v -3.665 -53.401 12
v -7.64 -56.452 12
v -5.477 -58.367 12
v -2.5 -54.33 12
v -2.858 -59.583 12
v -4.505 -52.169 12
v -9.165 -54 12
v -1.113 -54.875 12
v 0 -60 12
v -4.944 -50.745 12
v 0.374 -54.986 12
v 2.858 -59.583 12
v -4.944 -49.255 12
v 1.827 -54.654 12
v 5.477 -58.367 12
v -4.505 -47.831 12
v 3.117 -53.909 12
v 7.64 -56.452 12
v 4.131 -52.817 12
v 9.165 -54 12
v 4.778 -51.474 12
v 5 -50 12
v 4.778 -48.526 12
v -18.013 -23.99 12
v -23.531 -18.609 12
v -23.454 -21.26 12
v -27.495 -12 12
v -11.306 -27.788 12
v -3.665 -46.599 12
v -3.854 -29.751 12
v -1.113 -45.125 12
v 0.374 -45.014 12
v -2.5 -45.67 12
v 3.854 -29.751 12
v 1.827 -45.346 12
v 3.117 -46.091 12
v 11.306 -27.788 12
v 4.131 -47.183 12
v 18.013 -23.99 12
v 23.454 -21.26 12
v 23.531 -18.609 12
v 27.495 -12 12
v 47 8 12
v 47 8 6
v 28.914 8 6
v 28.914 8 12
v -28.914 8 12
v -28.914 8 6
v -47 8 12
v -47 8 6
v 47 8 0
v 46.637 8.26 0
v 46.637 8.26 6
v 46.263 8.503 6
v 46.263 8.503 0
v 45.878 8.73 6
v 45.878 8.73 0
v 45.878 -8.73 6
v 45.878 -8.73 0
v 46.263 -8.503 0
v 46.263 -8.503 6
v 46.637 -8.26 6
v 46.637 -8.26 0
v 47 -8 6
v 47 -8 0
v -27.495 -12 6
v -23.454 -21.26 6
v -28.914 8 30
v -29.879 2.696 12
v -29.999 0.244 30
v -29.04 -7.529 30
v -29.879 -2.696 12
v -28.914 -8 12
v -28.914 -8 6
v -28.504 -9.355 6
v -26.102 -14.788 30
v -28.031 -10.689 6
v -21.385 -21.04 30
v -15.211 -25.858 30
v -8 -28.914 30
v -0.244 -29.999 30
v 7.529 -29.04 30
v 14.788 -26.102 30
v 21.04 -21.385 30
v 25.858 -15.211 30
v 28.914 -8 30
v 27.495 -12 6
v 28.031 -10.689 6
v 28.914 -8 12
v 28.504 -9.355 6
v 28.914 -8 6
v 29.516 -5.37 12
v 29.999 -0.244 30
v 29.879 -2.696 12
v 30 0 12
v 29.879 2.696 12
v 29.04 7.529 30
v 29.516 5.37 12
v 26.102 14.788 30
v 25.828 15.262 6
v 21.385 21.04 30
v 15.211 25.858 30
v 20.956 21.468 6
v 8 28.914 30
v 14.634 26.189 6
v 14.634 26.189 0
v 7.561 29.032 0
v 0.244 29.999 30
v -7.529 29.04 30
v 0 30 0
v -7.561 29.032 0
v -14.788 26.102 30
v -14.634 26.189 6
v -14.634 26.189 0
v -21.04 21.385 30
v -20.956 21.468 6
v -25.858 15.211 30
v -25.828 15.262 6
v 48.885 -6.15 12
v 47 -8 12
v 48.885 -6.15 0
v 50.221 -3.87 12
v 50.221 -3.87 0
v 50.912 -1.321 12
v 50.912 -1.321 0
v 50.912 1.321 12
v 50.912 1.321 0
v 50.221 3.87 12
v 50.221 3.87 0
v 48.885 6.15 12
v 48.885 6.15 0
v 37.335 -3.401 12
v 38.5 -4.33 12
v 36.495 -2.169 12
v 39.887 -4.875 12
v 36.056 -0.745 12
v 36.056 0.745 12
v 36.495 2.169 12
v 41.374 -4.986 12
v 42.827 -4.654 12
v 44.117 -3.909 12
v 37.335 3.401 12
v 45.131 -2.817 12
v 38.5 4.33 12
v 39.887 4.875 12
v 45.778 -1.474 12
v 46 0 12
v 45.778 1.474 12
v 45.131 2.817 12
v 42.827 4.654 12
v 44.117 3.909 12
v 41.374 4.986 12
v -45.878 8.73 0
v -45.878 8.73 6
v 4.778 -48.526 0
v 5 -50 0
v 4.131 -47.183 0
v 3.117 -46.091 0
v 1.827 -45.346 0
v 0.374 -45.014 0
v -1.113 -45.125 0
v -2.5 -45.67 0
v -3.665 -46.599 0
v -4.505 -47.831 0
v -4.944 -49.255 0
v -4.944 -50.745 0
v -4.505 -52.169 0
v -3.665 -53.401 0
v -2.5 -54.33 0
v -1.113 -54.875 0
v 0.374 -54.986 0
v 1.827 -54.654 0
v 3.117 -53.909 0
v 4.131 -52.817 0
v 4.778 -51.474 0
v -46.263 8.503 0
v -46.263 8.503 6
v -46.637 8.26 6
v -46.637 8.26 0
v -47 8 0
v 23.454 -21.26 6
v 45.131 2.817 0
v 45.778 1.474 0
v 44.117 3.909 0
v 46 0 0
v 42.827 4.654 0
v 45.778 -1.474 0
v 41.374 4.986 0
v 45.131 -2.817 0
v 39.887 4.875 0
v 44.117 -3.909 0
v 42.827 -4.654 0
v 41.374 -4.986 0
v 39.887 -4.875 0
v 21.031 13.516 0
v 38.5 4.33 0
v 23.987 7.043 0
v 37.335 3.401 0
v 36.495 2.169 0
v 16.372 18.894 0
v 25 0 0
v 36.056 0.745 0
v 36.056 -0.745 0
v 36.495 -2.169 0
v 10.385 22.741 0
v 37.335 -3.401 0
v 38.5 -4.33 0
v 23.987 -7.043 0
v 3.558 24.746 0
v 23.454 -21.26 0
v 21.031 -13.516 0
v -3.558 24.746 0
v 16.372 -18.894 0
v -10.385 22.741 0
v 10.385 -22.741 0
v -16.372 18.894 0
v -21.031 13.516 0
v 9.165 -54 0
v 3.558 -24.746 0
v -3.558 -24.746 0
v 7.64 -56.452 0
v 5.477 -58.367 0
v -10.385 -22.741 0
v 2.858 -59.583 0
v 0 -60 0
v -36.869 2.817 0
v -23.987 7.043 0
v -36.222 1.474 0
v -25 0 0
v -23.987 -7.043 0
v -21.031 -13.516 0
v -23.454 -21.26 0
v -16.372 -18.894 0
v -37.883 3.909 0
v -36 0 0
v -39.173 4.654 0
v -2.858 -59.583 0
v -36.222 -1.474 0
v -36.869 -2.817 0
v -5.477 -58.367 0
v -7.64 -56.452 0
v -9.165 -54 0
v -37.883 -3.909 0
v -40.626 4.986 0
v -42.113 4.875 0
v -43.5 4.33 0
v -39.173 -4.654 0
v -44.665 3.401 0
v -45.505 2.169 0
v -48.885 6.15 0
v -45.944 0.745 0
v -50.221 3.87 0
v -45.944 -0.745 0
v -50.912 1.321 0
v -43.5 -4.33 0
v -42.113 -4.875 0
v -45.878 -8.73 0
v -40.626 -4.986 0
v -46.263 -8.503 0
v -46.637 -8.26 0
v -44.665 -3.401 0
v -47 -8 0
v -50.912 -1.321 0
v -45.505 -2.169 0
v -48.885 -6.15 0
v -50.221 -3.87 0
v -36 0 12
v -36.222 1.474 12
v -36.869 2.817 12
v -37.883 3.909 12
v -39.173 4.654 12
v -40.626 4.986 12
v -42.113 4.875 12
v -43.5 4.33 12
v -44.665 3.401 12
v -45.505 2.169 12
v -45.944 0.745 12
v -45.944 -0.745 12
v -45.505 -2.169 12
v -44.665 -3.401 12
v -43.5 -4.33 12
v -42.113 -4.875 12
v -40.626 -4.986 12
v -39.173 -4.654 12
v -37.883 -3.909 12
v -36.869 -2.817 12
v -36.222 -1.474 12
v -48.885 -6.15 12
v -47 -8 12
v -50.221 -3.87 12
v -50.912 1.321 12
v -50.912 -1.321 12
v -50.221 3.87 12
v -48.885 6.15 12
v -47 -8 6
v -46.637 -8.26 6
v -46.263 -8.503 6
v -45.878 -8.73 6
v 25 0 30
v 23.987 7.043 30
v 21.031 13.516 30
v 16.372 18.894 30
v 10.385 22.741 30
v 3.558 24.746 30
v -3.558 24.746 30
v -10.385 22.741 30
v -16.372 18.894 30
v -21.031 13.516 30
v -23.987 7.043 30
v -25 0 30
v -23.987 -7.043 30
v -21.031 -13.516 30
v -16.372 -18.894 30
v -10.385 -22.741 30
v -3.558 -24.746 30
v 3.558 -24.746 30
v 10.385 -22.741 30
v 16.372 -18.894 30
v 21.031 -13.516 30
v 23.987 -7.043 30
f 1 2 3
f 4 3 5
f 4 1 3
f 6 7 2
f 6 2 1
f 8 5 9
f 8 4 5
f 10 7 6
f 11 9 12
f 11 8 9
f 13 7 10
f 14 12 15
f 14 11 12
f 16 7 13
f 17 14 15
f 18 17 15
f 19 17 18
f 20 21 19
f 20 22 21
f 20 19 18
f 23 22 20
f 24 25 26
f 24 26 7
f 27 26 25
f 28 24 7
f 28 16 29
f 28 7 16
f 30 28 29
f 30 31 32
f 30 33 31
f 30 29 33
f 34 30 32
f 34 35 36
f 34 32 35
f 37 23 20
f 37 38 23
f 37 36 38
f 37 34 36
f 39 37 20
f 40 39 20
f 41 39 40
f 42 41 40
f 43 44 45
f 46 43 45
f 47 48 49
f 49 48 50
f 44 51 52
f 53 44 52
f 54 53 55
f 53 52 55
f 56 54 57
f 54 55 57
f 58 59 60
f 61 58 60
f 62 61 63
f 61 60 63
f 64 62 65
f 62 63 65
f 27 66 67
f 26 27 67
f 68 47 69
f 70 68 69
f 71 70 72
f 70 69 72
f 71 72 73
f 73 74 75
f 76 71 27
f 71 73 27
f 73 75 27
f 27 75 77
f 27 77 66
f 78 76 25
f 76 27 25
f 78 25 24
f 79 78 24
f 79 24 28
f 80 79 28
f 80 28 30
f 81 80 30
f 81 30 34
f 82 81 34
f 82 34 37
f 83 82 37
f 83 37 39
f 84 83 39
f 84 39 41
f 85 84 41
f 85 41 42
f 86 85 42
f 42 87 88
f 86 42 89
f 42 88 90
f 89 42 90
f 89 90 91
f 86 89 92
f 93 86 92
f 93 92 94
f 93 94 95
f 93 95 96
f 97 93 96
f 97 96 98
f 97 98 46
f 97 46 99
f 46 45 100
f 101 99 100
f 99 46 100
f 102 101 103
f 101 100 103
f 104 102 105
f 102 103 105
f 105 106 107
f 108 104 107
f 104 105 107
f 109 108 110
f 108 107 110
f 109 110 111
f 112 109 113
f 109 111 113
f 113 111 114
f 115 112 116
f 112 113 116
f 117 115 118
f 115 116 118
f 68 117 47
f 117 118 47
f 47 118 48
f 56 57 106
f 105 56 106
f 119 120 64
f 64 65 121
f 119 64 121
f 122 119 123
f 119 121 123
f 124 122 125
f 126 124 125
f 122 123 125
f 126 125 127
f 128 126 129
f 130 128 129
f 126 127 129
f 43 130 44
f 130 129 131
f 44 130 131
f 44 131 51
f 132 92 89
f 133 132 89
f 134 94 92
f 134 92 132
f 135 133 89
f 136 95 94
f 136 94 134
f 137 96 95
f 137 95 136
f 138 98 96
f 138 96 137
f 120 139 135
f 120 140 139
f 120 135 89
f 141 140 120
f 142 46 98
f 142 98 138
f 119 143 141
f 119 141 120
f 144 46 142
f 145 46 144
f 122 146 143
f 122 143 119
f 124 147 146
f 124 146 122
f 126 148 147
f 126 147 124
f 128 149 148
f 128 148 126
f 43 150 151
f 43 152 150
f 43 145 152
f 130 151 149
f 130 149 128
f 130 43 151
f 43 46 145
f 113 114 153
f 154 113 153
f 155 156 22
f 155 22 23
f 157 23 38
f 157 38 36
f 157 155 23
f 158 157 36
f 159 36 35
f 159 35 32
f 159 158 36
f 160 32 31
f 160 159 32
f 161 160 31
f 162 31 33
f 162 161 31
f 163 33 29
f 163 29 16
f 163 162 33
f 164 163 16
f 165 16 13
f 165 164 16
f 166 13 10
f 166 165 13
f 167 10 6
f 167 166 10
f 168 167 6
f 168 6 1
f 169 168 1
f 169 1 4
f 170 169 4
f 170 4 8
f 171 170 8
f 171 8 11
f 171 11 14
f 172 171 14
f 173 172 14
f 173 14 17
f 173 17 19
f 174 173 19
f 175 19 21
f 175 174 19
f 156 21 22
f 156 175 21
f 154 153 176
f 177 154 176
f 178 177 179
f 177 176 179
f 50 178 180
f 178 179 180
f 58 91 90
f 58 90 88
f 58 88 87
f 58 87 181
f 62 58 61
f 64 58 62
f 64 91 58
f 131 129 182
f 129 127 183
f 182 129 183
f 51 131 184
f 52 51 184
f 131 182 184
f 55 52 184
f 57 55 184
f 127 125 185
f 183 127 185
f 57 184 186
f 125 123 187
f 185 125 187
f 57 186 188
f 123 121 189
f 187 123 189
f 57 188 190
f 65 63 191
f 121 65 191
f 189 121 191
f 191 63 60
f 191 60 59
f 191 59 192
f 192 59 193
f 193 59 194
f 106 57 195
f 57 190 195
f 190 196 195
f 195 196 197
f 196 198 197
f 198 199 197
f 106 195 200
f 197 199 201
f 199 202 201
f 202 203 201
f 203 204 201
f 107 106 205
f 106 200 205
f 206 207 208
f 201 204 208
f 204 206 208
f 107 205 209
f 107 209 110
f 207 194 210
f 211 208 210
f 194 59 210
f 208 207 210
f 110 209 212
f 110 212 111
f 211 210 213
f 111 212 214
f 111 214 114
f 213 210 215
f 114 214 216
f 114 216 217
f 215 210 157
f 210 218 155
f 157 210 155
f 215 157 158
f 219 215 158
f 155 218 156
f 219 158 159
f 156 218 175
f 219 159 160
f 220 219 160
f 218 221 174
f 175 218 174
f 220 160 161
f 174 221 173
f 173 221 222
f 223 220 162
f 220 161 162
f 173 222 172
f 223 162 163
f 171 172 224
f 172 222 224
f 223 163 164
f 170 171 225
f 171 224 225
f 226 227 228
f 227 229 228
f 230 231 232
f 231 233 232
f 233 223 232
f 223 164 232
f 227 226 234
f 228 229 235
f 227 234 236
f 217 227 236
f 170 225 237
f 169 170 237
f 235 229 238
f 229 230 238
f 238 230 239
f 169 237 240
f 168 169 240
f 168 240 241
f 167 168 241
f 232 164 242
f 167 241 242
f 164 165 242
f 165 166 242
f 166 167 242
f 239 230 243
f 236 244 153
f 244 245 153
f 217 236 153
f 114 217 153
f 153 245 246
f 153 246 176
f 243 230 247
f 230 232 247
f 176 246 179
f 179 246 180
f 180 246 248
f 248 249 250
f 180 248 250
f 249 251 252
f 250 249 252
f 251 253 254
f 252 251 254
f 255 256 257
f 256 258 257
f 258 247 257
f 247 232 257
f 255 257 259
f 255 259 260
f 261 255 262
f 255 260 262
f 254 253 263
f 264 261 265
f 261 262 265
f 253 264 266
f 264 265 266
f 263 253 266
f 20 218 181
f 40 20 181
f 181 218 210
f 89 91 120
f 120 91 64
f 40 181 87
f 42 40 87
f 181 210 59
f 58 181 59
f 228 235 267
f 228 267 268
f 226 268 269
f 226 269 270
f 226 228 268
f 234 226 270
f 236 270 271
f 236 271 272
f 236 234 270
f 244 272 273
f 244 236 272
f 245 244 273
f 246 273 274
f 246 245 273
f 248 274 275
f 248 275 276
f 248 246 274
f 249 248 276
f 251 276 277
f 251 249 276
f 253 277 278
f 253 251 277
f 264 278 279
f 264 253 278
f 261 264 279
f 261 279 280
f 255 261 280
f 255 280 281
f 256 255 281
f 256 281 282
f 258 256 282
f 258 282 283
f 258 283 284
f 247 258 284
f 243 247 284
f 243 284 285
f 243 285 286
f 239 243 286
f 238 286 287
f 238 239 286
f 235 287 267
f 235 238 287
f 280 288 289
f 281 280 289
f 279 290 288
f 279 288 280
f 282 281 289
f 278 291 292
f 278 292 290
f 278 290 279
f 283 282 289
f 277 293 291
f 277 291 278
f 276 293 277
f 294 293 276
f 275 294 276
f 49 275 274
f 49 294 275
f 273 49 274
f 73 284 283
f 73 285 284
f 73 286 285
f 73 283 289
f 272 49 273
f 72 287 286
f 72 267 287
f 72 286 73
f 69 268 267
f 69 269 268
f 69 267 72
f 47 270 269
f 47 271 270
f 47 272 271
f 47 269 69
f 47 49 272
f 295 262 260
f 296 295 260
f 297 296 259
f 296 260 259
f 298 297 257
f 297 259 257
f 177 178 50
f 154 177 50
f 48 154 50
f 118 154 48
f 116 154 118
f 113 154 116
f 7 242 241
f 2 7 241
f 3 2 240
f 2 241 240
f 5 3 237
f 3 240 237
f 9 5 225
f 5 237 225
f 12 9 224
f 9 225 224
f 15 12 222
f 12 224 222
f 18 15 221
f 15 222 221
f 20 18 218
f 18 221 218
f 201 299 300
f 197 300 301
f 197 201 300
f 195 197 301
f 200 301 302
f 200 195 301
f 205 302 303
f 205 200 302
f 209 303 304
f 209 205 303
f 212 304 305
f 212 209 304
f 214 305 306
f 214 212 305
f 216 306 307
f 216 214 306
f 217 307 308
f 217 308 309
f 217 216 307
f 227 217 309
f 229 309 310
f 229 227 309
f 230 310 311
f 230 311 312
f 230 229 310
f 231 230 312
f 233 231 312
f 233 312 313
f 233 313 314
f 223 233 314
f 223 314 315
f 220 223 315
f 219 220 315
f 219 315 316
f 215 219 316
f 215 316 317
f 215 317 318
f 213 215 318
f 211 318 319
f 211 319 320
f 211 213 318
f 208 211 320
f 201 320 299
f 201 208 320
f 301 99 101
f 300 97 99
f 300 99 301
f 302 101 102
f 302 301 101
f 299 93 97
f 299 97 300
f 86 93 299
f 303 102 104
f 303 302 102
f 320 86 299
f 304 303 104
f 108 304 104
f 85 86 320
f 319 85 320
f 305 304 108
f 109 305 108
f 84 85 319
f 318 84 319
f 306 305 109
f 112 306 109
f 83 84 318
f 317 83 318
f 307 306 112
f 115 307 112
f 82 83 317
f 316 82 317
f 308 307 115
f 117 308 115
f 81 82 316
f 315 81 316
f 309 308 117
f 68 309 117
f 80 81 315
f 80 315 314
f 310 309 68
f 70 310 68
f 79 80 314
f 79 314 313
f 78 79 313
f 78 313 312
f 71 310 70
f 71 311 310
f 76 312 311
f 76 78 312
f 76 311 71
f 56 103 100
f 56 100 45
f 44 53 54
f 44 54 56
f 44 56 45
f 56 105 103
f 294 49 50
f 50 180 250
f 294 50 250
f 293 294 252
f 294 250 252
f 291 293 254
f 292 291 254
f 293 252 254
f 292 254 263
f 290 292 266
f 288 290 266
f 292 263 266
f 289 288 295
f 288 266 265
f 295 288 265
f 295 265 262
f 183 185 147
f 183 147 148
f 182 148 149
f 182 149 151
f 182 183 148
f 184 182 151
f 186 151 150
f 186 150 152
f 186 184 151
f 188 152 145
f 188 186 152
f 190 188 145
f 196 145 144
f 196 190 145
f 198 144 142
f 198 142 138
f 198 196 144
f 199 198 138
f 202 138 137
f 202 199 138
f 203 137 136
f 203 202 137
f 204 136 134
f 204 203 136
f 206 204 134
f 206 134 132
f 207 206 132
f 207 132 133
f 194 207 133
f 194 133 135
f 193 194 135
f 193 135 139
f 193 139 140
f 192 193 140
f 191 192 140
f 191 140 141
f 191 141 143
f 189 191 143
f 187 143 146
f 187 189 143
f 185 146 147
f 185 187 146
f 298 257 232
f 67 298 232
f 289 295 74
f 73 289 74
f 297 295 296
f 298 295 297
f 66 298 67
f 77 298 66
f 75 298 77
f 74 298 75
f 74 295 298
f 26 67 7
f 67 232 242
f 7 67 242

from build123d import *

# Parameters (mm, degrees)
SKETCH1_R             = 5
BOSS_EXTRUDE1_DEPTH   = 12
BOSS_EXTRUDE1_2_DEPTH = 12
BOSS_EXTRUDE1_3_DEPTH = 12
BOSS_EXTRUDE2_DEPTH   = 6
SKETCH1_4_R           = 25
BOSS_EXTRUDE3_DEPTH   = 30


with BuildPart() as part:
    # Sketch1 → Boss-Extrude1 (new body)
    with BuildSketch(Plane.XY):
        with BuildLine():
            ThreePointArc((47, -8), (51, 0), (47, 8))
            Line((47, 8), (28.91366459, 8))
            ThreePointArc((28.91366459, 8), (30, 0), (28.91366459, -8))
            Line((28.91366459, -8), (47, -8))
        make_face()
        with Locations((41, 0)):
            Circle(SKETCH1_R, mode=Mode.SUBTRACT)
    extrude(amount=BOSS_EXTRUDE1_DEPTH)



with BuildPart() as body_2:
    # Sketch1 → Boss-Extrude1 2 (new body)
    with BuildSketch(Plane.XY):
        with BuildLine():
            ThreePointArc((-28.91366459, -8), (-30, 0), (-28.91366459, 8))
            Line((-28.91366459, 8), (-47, 8))
            ThreePointArc((-47, 8), (-51, 0), (-47, -8))
            Line((-47, -8), (-28.91366459, -8))
        make_face()
        with Locations((-41, 0)):
            Circle(SKETCH1_R, mode=Mode.SUBTRACT)
    extrude(amount=BOSS_EXTRUDE1_2_DEPTH)


with BuildPart() as body_3:
    # Sketch1 → Boss-Extrude1 3 (new body)
    with BuildSketch(Plane.XY):
        with BuildLine():
            Line((9.16515139, -54), (27.49545417, -12))
            ThreePointArc((27.49545417, -12), (0, -30), (-27.49545417, -12))
            Line((-27.49545417, -12), (-9.16515139, -54))
            ThreePointArc((-9.16515139, -54), (0, -60), (9.16515139, -54))
        make_face()
        with Locations((0, -50)):
            Circle(SKETCH1_R, mode=Mode.SUBTRACT)
    extrude(amount=BOSS_EXTRUDE1_3_DEPTH)


with BuildPart() as part_1:
    add(part.part)

    add(body_2.part)  # Boss-Extrude2 merges body 2

    add(body_3.part)  # Boss-Extrude2 merges body 3
    # Sketch1<3> → Boss-Extrude2 (add)
    with BuildSketch(Plane.XY):
        with BuildLine():
            ThreePointArc((47, 8), (46.451241941, 8.383553024), (45.87804878, 8.729526911))
            Line((45.87804878, 8.729526911), (14.634146341, 26.188580734))
            ThreePointArc((14.634146341, 26.188580734), (23.596802252, 18.52541291), (28.91366459, 8))
            Line((28.91366459, 8), (47, 8))
        make_face()
        with BuildLine():
            ThreePointArc((-28.91366459, 8), (-23.596802252, 18.52541291), (-14.634146341, 26.188580734))
            Line((-14.634146341, 26.188580734), (-45.87804878, 8.729526911))
            ThreePointArc((-45.87804878, 8.729526911), (-46.451241941, 8.383553024), (-47, 8))
            Line((-47, 8), (-28.91366459, 8))
        make_face()
        with BuildLine():
            ThreePointArc((45.87804878, -8.729526911), (46.451241941, -8.383553024), (47, -8))
            Line((47, -8), (28.91366459, -8))
            ThreePointArc((28.91366459, -8), (28.275380984, -10.025109984), (27.49545417, -12))
            Line((27.49545417, -12), (23.454044644, -21.260032532))
            Line((23.454044644, -21.260032532), (45.87804878, -8.729526911))
        make_face()
        with BuildLine():
            ThreePointArc((-27.49545417, -12), (-28.275380984, -10.025109984), (-28.91366459, -8))
            Line((-28.91366459, -8), (-47, -8))
            ThreePointArc((-47, -8), (-46.451241941, -8.383553024), (-45.87804878, -8.729526911))
            Line((-45.87804878, -8.729526911), (-23.454044644, -21.260032532))
            Line((-23.454044644, -21.260032532), (-27.49545417, -12))
        make_face()
    extrude(amount=BOSS_EXTRUDE2_DEPTH)

    # Sketch1<4> → Boss-Extrude3 (add)
    with BuildSketch(Plane.XY):
        with BuildLine():
            ThreePointArc((28.91366459, 8), (23.596802252, 18.52541291), (14.634146341, 26.188580734))
            ThreePointArc((14.634146341, 26.188580734), (0, 30), (-14.634146341, 26.188580734))
            ThreePointArc((-14.634146341, 26.188580734), (-23.596802252, 18.52541291), (-28.91366459, 8))
            ThreePointArc((-28.91366459, 8), (-30, 0), (-28.91366459, -8))
            ThreePointArc((-28.91366459, -8), (-28.275380984, -10.025109984), (-27.49545417, -12))
            ThreePointArc((-27.49545417, -12), (0, -30), (27.49545417, -12))
            ThreePointArc((27.49545417, -12), (28.275380984, -10.025109984), (28.91366459, -8))
            ThreePointArc((28.91366459, -8), (29.727175595, -4.036710437), (30, 0))
            ThreePointArc((30, 0), (29.727175595, 4.036710437), (28.91366459, 8))
        make_face()
        Circle(SKETCH1_4_R, mode=Mode.SUBTRACT)
    extrude(amount=BOSS_EXTRUDE3_DEPTH)


solid = part_1.part
